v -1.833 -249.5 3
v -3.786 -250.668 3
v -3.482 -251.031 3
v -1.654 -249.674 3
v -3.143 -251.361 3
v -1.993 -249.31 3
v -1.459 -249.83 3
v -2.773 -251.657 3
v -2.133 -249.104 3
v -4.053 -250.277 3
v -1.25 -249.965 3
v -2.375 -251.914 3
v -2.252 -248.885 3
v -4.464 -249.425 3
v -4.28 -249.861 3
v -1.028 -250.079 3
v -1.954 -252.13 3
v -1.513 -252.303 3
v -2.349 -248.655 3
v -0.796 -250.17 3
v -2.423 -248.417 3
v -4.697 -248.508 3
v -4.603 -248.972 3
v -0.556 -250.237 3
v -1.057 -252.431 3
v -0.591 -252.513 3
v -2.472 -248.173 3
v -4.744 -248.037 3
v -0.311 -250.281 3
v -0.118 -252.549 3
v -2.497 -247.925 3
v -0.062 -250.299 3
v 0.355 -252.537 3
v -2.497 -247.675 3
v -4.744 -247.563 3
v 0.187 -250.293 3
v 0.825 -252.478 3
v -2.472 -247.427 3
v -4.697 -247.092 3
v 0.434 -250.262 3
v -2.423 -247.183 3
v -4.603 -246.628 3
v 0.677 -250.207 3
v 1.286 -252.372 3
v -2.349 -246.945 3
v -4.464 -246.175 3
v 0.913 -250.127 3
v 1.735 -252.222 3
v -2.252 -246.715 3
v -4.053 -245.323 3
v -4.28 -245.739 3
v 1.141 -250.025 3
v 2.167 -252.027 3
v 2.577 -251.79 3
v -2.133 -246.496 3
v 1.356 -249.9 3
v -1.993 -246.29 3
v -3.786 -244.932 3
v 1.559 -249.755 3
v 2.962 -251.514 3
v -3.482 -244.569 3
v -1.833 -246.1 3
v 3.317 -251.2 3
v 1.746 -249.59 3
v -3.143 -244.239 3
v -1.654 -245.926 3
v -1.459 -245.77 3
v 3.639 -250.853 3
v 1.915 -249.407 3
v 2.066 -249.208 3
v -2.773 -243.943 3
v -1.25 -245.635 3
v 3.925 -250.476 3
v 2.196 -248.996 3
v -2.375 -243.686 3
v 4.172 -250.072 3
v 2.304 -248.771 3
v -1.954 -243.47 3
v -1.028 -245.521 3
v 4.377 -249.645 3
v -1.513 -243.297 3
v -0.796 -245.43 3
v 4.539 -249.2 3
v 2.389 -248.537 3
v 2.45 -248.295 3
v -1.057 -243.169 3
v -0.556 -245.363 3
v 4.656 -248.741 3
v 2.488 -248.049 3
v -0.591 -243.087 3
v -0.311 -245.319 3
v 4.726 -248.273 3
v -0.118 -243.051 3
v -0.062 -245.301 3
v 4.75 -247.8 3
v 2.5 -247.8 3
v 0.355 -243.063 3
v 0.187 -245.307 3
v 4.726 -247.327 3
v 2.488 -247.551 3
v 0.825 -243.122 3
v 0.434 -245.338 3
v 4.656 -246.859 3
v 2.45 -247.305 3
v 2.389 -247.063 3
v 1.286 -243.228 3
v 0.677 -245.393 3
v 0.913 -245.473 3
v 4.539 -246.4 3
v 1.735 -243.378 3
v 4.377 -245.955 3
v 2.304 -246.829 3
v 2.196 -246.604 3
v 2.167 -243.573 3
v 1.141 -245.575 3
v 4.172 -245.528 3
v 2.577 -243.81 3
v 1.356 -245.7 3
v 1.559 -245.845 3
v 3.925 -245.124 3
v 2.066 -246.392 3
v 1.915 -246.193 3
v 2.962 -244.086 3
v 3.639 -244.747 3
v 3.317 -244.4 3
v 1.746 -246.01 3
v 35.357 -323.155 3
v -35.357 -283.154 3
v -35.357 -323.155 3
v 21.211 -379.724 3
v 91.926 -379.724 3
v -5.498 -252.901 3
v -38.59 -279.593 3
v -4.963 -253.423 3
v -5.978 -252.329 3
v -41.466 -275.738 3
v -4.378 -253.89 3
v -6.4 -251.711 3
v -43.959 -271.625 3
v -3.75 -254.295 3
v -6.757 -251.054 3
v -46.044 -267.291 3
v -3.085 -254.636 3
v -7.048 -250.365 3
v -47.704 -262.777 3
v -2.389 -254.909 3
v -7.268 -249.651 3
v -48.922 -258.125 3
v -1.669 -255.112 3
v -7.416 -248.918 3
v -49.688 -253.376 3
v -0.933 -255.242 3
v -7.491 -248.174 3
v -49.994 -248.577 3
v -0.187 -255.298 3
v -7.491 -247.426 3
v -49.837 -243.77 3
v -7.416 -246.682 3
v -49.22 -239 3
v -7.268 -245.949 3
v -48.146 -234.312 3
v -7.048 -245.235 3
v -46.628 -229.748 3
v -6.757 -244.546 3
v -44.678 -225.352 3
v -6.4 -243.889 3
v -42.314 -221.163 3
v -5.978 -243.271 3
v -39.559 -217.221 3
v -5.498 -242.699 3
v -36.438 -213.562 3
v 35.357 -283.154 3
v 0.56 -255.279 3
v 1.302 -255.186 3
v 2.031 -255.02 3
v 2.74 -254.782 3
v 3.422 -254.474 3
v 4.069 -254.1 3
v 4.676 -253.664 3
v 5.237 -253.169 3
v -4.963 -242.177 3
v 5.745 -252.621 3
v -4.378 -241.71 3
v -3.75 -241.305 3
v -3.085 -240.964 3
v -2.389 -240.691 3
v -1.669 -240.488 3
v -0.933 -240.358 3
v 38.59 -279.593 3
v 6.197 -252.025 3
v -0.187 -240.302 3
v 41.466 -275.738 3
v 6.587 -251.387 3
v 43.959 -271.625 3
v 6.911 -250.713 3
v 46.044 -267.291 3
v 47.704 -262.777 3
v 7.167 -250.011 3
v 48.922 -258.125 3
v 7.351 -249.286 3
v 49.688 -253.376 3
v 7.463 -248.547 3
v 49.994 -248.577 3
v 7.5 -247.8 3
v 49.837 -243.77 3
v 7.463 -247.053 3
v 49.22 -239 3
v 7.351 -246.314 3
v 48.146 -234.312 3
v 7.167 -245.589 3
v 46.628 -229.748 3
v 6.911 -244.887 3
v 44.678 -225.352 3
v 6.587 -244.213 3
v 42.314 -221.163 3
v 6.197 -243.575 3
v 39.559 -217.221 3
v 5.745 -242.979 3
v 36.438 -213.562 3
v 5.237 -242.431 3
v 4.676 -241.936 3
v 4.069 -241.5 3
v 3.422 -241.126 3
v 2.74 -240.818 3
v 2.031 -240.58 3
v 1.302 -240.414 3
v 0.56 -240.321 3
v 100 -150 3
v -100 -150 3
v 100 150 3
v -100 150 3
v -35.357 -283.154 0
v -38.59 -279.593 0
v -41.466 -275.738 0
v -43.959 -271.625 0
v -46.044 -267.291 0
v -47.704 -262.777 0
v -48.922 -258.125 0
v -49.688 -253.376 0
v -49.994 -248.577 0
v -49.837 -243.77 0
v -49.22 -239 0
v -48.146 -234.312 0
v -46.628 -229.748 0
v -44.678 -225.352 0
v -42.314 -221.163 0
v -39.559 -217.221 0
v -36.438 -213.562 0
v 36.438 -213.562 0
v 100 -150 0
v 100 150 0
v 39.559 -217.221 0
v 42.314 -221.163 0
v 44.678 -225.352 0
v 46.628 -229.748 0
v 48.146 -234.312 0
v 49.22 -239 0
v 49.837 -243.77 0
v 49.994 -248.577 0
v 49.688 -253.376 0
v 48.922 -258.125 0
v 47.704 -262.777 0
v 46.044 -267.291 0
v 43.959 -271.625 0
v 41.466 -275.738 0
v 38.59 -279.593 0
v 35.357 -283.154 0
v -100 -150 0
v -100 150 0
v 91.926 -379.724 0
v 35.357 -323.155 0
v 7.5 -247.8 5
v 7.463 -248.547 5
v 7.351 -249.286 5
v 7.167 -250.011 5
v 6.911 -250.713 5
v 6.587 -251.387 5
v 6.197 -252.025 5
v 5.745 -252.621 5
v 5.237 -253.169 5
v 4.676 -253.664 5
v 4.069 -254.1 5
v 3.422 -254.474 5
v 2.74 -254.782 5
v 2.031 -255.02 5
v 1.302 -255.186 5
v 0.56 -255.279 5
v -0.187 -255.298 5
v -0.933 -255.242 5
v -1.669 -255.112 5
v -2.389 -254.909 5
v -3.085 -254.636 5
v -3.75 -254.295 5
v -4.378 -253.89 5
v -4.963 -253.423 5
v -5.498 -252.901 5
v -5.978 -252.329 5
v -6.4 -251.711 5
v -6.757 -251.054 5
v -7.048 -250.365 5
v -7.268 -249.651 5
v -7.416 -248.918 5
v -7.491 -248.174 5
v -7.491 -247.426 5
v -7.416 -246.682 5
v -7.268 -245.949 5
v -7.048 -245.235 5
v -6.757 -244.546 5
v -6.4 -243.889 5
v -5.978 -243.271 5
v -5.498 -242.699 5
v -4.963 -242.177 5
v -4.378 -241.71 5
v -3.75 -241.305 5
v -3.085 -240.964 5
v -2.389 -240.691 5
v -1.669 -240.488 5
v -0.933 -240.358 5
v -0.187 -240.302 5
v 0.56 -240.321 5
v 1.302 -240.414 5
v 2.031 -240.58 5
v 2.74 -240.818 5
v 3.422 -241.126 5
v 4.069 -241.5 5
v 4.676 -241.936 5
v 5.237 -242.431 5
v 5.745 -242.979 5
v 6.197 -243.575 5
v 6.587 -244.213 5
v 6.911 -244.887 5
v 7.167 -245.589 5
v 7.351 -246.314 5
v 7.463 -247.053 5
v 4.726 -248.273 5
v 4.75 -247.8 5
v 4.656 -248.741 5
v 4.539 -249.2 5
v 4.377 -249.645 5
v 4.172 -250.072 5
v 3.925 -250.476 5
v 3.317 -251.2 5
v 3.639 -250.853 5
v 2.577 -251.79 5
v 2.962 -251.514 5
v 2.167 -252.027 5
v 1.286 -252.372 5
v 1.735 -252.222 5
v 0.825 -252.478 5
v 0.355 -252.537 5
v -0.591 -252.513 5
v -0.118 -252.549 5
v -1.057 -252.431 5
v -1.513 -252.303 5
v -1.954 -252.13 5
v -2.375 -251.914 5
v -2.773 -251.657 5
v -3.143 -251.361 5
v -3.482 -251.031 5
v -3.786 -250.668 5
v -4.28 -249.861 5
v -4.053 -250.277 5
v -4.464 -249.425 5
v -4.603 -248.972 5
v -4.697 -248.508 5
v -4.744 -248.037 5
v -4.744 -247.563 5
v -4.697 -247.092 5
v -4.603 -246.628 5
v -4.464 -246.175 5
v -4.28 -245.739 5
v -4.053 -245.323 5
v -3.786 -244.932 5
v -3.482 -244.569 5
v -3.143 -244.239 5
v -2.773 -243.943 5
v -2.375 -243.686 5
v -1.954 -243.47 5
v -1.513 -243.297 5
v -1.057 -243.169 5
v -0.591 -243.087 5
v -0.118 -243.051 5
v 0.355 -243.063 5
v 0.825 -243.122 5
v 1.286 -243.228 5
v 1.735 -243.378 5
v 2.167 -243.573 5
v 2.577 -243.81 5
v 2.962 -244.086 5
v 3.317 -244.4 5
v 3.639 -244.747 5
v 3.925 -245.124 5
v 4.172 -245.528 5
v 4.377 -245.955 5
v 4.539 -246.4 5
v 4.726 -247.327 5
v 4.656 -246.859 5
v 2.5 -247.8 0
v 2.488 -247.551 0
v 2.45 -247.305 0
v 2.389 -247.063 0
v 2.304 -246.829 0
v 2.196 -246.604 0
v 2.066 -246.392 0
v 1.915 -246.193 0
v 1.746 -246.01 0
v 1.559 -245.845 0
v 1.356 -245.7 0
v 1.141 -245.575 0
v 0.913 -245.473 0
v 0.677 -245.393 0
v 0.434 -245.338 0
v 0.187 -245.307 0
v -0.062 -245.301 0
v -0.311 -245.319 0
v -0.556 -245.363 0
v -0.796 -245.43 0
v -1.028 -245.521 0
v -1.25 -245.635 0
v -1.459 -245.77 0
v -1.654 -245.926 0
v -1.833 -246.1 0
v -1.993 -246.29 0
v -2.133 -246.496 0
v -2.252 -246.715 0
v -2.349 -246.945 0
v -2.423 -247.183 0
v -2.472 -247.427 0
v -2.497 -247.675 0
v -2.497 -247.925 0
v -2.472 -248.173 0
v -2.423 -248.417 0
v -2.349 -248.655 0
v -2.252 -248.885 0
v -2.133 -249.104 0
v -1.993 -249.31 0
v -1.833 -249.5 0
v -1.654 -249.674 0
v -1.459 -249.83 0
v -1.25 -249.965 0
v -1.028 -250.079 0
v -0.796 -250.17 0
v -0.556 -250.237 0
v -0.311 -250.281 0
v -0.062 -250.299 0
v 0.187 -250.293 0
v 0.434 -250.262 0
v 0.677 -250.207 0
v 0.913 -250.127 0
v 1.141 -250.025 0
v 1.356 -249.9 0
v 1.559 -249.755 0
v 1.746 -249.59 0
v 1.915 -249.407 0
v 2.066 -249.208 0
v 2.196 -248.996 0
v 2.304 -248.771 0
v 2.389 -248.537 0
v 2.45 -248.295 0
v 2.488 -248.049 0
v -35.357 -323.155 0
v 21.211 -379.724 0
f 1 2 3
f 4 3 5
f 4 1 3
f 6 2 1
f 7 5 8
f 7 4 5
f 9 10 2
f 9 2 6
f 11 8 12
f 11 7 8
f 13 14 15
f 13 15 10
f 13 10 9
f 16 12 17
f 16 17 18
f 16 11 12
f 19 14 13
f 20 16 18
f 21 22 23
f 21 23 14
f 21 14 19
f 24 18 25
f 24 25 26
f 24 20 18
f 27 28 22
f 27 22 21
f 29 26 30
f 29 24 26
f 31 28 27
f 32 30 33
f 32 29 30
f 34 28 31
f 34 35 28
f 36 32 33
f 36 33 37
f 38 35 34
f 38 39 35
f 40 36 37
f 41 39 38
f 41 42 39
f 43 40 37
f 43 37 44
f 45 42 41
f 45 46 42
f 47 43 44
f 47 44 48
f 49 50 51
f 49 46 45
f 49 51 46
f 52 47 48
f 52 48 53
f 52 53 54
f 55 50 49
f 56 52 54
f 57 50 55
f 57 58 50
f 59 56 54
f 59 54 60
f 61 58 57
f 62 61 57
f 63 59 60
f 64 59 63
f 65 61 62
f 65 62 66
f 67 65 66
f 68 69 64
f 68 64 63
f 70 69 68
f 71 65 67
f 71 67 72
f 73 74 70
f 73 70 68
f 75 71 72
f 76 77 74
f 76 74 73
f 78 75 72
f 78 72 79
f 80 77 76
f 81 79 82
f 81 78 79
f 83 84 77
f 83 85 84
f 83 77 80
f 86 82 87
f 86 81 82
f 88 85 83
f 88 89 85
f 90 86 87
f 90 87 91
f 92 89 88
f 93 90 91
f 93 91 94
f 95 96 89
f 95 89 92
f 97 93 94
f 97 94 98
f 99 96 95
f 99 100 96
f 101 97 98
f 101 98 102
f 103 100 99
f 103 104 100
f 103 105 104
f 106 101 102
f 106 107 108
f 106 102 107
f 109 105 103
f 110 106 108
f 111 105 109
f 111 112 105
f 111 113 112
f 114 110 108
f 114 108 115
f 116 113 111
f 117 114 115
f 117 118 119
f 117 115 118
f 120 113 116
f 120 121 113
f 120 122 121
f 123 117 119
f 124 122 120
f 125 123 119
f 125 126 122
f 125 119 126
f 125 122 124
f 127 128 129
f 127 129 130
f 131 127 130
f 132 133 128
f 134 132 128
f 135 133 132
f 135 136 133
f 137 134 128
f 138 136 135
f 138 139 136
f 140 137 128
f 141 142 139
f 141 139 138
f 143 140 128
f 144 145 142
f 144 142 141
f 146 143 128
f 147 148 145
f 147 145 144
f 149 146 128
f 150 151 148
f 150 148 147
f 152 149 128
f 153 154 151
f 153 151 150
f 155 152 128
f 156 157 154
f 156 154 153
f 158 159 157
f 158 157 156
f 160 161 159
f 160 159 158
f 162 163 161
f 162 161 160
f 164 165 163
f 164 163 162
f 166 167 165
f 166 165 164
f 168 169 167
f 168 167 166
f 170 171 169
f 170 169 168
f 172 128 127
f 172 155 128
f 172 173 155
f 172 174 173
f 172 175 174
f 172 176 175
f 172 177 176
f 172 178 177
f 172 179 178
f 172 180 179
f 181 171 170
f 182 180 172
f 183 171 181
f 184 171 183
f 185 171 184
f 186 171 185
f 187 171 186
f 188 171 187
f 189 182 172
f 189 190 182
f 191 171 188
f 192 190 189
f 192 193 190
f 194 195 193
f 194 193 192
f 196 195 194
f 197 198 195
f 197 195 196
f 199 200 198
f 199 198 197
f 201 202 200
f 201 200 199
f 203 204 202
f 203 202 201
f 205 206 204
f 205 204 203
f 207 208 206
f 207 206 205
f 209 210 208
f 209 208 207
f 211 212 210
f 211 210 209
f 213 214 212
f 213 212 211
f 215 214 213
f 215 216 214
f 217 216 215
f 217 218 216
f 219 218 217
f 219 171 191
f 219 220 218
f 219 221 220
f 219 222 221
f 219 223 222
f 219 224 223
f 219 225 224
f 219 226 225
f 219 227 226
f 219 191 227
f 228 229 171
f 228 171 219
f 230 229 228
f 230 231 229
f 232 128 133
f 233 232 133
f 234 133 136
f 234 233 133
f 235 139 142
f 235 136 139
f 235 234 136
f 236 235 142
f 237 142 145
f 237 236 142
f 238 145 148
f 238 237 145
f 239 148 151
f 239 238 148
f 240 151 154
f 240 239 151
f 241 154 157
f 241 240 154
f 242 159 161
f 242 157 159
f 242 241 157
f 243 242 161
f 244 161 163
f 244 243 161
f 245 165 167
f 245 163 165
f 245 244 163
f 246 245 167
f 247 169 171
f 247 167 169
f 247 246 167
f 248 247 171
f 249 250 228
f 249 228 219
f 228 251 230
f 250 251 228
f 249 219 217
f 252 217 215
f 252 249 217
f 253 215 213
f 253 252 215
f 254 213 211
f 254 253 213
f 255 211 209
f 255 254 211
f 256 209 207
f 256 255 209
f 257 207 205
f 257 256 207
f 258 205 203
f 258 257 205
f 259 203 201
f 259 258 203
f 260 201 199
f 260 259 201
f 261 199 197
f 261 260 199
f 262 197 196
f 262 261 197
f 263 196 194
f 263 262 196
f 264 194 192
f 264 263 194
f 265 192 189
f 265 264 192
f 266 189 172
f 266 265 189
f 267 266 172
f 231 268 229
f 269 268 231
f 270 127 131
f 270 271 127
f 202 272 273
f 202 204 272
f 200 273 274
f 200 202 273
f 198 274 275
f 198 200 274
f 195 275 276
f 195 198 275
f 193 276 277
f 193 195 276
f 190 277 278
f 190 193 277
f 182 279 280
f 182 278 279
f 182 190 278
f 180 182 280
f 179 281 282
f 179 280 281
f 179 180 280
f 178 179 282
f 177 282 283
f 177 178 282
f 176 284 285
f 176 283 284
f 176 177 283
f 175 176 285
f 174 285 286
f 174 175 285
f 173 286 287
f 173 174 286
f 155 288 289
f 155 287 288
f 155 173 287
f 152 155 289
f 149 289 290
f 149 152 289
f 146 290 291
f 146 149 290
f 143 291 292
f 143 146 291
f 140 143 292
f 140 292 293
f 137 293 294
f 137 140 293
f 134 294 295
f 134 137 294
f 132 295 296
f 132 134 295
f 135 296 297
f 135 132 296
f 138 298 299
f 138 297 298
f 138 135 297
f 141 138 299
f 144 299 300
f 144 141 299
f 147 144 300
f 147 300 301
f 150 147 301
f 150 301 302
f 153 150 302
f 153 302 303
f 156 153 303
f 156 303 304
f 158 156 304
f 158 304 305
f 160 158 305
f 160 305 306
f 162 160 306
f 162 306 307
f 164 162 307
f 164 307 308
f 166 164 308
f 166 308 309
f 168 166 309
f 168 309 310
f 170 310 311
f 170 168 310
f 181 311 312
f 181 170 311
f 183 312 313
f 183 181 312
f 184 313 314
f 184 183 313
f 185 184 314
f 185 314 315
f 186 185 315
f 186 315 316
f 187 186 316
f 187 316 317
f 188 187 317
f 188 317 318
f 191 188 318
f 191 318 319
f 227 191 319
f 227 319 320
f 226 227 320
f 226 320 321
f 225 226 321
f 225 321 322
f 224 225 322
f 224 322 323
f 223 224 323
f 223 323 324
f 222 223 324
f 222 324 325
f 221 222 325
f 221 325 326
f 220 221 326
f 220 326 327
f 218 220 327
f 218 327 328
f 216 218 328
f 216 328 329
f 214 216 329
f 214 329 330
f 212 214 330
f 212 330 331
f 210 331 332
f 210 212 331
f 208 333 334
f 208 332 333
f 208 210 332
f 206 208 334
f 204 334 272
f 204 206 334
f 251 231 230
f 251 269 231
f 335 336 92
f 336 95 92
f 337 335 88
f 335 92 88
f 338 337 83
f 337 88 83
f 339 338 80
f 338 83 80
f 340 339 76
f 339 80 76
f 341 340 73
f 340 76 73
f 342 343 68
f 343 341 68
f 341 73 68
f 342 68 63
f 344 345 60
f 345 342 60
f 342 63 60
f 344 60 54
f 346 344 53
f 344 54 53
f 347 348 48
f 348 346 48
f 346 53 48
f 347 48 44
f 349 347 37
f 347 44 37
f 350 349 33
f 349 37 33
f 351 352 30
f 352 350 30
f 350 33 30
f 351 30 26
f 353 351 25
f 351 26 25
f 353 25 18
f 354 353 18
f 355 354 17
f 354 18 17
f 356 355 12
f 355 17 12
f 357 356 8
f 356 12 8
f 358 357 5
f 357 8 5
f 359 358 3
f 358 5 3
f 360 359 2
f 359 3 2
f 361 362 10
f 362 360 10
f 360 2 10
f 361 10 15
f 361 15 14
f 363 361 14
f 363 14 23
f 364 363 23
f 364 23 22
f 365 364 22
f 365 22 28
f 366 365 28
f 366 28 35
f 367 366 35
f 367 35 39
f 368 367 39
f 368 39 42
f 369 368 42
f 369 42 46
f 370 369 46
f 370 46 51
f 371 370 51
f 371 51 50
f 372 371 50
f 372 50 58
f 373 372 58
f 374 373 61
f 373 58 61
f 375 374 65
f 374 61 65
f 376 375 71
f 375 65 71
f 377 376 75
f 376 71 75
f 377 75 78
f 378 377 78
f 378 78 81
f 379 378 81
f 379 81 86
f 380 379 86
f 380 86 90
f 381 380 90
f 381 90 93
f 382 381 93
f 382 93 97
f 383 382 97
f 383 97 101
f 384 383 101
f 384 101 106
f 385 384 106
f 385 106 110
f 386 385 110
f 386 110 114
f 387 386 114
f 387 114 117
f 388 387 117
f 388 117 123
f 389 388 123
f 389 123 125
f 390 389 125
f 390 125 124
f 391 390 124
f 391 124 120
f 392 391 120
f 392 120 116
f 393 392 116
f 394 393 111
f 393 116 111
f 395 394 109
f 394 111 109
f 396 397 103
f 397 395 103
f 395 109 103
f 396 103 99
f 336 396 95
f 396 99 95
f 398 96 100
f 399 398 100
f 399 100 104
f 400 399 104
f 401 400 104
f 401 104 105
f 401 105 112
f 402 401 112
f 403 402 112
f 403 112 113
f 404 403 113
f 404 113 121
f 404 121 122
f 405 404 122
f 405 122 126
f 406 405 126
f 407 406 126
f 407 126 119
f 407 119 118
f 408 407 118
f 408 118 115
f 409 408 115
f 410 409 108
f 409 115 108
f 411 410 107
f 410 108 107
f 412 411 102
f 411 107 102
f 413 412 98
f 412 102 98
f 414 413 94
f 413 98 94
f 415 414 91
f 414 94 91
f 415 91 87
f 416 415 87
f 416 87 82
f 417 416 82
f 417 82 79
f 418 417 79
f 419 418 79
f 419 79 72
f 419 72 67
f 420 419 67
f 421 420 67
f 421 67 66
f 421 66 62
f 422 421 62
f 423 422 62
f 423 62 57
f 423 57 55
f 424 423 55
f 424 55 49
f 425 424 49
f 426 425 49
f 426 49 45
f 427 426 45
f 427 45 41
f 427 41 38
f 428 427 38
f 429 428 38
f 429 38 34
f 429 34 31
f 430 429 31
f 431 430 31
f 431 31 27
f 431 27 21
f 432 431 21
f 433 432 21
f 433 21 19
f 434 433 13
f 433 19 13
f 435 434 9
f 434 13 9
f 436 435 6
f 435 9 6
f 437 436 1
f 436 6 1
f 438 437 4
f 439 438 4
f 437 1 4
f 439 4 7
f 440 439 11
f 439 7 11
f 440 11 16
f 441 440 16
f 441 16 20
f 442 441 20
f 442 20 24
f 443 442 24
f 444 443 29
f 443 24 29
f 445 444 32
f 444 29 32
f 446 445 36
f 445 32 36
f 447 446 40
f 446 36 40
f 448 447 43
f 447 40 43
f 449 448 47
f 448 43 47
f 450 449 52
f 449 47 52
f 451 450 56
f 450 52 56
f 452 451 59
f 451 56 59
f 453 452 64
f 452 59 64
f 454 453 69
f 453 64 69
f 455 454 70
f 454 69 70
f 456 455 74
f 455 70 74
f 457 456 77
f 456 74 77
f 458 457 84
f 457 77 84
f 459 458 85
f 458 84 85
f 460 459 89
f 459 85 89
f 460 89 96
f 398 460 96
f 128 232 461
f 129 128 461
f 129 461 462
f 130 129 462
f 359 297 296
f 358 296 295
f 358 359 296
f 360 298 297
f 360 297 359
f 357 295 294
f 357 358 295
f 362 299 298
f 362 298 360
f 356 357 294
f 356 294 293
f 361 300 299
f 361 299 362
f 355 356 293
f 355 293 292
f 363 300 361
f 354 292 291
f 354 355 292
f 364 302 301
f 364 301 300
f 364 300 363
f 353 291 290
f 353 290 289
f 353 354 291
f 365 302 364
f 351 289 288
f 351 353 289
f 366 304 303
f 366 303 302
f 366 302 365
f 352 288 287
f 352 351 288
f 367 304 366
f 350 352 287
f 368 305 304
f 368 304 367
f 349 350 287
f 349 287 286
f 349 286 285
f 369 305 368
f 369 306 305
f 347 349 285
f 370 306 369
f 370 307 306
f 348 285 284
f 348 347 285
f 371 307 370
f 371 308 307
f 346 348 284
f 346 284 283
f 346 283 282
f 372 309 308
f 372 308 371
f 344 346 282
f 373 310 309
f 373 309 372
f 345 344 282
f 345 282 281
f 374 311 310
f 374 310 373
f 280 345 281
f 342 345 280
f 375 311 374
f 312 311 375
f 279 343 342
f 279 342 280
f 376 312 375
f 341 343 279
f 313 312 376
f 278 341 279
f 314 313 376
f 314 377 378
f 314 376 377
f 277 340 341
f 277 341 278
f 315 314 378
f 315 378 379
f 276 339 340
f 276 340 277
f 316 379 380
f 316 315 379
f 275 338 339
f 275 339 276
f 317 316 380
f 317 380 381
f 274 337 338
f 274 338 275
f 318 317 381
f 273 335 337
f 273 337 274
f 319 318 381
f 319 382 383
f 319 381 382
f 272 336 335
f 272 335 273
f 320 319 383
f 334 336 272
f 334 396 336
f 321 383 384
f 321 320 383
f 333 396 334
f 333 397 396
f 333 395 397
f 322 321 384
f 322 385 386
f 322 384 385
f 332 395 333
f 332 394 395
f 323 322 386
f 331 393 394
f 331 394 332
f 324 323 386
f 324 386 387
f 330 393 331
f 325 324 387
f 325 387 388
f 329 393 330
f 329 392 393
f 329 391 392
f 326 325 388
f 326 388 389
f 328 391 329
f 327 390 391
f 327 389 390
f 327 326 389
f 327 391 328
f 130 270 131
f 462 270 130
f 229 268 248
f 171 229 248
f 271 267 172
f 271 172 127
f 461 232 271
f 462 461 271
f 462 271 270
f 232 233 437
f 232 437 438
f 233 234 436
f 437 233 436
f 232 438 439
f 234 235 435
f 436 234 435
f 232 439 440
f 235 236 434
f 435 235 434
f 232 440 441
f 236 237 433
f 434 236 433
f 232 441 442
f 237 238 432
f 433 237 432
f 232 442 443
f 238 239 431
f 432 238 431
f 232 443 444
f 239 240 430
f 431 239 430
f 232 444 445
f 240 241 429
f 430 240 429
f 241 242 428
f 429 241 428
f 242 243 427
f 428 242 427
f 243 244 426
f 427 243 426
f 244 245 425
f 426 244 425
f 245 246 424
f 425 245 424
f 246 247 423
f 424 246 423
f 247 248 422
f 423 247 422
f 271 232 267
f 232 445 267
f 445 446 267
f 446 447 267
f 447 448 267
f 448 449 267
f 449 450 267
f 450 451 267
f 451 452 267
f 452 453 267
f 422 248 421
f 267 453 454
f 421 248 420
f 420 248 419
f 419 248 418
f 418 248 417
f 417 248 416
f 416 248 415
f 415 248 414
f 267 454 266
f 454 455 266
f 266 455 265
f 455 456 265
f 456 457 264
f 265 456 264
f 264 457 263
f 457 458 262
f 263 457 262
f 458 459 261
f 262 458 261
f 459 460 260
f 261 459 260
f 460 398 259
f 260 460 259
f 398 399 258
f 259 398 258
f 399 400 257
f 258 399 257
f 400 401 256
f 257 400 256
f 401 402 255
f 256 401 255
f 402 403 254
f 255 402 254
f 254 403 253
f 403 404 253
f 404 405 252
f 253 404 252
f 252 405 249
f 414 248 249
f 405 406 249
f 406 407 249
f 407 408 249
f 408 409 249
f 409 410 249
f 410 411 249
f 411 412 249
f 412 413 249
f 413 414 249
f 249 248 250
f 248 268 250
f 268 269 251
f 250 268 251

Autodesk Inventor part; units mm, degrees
ref_plane "YZ Plane" through (0, 0, 0) normal (1, 0, 0) x (0, 1, 0)
ref_plane "XZ Plane" through (0, 0, 0) normal (0, 1, 0) x (-1, 0, 0)
ref_plane "XY Plane" through (0, 0, 0) normal (0, 0, 1) x (1, 0, 0)
sketch "Sketch1" plane through (0, 0, 0) normal (0, 0, 1) x (1, 0, 0)
  line L0 (-100, 150) -> (100, 150)
  line L1 (100, 150) -> (100, -150)
  line L2 (-100, -150) -> (-100, 150)
  line L3 (-100, 150) -> (100, -150) construction
  line L4 (100, 150) -> (-100, -150) construction
  line L5 (100, -150) -> (36.4382, -213.5618)
  line L6 (-35.3571, -283.1536) -> (-35.3571, -323.1554)
  line L7 (-35.3571, -323.1554) -> (21.2114, -379.7239)
  line L8 (35.3571, -283.1536) -> (35.3571, -323.1554)
  line L9 (35.3571, -323.1554) -> (91.9257, -379.7239)
  line L10 (91.9257, -379.7239) -> (21.2114, -379.7239)
  arc A0 (-35.3571, -283.1536) -> (-35.3553, -283.1554) centre (0, -247.8) ccw
  arc A1 (-36.4382, -213.5618) -> (-35.3553, -283.1554) centre (0, -247.8) ccw
  arc A2 (35.3571, -283.1536) -> (36.4382, -213.5618) centre (0, -247.8) ccw
  line L11 (-100, -150) -> (-36.4382, -213.5618)
  point P0 (0, 0)
  point P1 (35.3571, -285.3571)
extrude "Extrusion1" add sketch "Sketch1" along normal blind 3
sketch "Sketch2" plane through (0, 0, 3) normal (0, 0, 1) x (1, 0, 0)
  arc A0 (35.3571, -283.1536) -> (36.4382, -213.5618) centre (0, -247.8) ccw projected
  circle A1 centre (0, -247.8) radius 2.5
  circle A2 centre (0, -247.8) radius 4.75
  circle A3 centre (0, -247.8) radius 7.5
  point P0 (0, 0)
  dimension "d20" = 5
  dimension "d21" = 9.5
  dimension "d22" = 15
extrude "Extrusion2" cut sketch "Sketch2" against normal blind 3 contours A1
extrude "Extrusion3" add sketch "Sketch2" along normal blind 2 contours A3
properties part number "leftside0"
